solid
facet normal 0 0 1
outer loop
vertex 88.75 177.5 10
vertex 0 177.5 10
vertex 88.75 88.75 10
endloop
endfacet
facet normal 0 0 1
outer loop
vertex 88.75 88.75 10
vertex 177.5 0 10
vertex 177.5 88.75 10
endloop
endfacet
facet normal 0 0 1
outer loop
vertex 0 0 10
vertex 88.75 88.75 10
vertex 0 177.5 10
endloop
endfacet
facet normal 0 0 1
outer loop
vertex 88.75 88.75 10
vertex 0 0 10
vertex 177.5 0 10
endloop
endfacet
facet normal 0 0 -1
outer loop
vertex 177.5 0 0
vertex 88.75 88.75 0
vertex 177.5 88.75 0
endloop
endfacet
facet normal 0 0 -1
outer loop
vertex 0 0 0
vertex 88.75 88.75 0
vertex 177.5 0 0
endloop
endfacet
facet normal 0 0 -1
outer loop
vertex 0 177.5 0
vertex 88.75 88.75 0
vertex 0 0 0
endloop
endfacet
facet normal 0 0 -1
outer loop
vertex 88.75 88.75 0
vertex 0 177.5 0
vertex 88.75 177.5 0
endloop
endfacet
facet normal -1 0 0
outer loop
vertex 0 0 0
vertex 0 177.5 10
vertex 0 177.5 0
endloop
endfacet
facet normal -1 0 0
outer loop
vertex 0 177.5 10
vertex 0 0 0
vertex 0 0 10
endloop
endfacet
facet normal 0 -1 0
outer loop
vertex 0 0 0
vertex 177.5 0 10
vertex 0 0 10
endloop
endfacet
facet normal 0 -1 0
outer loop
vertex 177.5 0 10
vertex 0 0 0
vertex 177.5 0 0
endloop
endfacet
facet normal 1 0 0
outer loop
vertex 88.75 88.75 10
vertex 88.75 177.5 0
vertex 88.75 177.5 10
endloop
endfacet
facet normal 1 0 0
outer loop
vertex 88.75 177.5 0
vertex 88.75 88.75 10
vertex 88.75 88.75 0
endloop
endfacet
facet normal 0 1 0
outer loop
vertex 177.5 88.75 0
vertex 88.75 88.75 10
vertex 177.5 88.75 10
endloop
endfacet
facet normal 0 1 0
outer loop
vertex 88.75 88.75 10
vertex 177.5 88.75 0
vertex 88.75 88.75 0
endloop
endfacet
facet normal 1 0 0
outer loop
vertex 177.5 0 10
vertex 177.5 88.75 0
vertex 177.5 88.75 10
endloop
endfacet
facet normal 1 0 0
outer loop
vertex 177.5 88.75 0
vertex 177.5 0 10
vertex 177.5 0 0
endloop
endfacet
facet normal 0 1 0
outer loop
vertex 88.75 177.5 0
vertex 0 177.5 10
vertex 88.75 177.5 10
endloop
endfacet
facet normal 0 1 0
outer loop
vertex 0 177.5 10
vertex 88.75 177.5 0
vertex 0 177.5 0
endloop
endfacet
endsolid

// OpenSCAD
difference(){
difference(){
cube([355,355,10]);
translate([355/4,355/4,-5])
cube([355/2,355/2,20]);
}
translate([355/2,-10,-10])
cube([355,355+30,50]);
translate([-10,355/2,-10])
cube([355,355,50]);
}
//translate([355/4-10,355/4-10,10])
//cube([355/2+20,355/2+20,10]);
